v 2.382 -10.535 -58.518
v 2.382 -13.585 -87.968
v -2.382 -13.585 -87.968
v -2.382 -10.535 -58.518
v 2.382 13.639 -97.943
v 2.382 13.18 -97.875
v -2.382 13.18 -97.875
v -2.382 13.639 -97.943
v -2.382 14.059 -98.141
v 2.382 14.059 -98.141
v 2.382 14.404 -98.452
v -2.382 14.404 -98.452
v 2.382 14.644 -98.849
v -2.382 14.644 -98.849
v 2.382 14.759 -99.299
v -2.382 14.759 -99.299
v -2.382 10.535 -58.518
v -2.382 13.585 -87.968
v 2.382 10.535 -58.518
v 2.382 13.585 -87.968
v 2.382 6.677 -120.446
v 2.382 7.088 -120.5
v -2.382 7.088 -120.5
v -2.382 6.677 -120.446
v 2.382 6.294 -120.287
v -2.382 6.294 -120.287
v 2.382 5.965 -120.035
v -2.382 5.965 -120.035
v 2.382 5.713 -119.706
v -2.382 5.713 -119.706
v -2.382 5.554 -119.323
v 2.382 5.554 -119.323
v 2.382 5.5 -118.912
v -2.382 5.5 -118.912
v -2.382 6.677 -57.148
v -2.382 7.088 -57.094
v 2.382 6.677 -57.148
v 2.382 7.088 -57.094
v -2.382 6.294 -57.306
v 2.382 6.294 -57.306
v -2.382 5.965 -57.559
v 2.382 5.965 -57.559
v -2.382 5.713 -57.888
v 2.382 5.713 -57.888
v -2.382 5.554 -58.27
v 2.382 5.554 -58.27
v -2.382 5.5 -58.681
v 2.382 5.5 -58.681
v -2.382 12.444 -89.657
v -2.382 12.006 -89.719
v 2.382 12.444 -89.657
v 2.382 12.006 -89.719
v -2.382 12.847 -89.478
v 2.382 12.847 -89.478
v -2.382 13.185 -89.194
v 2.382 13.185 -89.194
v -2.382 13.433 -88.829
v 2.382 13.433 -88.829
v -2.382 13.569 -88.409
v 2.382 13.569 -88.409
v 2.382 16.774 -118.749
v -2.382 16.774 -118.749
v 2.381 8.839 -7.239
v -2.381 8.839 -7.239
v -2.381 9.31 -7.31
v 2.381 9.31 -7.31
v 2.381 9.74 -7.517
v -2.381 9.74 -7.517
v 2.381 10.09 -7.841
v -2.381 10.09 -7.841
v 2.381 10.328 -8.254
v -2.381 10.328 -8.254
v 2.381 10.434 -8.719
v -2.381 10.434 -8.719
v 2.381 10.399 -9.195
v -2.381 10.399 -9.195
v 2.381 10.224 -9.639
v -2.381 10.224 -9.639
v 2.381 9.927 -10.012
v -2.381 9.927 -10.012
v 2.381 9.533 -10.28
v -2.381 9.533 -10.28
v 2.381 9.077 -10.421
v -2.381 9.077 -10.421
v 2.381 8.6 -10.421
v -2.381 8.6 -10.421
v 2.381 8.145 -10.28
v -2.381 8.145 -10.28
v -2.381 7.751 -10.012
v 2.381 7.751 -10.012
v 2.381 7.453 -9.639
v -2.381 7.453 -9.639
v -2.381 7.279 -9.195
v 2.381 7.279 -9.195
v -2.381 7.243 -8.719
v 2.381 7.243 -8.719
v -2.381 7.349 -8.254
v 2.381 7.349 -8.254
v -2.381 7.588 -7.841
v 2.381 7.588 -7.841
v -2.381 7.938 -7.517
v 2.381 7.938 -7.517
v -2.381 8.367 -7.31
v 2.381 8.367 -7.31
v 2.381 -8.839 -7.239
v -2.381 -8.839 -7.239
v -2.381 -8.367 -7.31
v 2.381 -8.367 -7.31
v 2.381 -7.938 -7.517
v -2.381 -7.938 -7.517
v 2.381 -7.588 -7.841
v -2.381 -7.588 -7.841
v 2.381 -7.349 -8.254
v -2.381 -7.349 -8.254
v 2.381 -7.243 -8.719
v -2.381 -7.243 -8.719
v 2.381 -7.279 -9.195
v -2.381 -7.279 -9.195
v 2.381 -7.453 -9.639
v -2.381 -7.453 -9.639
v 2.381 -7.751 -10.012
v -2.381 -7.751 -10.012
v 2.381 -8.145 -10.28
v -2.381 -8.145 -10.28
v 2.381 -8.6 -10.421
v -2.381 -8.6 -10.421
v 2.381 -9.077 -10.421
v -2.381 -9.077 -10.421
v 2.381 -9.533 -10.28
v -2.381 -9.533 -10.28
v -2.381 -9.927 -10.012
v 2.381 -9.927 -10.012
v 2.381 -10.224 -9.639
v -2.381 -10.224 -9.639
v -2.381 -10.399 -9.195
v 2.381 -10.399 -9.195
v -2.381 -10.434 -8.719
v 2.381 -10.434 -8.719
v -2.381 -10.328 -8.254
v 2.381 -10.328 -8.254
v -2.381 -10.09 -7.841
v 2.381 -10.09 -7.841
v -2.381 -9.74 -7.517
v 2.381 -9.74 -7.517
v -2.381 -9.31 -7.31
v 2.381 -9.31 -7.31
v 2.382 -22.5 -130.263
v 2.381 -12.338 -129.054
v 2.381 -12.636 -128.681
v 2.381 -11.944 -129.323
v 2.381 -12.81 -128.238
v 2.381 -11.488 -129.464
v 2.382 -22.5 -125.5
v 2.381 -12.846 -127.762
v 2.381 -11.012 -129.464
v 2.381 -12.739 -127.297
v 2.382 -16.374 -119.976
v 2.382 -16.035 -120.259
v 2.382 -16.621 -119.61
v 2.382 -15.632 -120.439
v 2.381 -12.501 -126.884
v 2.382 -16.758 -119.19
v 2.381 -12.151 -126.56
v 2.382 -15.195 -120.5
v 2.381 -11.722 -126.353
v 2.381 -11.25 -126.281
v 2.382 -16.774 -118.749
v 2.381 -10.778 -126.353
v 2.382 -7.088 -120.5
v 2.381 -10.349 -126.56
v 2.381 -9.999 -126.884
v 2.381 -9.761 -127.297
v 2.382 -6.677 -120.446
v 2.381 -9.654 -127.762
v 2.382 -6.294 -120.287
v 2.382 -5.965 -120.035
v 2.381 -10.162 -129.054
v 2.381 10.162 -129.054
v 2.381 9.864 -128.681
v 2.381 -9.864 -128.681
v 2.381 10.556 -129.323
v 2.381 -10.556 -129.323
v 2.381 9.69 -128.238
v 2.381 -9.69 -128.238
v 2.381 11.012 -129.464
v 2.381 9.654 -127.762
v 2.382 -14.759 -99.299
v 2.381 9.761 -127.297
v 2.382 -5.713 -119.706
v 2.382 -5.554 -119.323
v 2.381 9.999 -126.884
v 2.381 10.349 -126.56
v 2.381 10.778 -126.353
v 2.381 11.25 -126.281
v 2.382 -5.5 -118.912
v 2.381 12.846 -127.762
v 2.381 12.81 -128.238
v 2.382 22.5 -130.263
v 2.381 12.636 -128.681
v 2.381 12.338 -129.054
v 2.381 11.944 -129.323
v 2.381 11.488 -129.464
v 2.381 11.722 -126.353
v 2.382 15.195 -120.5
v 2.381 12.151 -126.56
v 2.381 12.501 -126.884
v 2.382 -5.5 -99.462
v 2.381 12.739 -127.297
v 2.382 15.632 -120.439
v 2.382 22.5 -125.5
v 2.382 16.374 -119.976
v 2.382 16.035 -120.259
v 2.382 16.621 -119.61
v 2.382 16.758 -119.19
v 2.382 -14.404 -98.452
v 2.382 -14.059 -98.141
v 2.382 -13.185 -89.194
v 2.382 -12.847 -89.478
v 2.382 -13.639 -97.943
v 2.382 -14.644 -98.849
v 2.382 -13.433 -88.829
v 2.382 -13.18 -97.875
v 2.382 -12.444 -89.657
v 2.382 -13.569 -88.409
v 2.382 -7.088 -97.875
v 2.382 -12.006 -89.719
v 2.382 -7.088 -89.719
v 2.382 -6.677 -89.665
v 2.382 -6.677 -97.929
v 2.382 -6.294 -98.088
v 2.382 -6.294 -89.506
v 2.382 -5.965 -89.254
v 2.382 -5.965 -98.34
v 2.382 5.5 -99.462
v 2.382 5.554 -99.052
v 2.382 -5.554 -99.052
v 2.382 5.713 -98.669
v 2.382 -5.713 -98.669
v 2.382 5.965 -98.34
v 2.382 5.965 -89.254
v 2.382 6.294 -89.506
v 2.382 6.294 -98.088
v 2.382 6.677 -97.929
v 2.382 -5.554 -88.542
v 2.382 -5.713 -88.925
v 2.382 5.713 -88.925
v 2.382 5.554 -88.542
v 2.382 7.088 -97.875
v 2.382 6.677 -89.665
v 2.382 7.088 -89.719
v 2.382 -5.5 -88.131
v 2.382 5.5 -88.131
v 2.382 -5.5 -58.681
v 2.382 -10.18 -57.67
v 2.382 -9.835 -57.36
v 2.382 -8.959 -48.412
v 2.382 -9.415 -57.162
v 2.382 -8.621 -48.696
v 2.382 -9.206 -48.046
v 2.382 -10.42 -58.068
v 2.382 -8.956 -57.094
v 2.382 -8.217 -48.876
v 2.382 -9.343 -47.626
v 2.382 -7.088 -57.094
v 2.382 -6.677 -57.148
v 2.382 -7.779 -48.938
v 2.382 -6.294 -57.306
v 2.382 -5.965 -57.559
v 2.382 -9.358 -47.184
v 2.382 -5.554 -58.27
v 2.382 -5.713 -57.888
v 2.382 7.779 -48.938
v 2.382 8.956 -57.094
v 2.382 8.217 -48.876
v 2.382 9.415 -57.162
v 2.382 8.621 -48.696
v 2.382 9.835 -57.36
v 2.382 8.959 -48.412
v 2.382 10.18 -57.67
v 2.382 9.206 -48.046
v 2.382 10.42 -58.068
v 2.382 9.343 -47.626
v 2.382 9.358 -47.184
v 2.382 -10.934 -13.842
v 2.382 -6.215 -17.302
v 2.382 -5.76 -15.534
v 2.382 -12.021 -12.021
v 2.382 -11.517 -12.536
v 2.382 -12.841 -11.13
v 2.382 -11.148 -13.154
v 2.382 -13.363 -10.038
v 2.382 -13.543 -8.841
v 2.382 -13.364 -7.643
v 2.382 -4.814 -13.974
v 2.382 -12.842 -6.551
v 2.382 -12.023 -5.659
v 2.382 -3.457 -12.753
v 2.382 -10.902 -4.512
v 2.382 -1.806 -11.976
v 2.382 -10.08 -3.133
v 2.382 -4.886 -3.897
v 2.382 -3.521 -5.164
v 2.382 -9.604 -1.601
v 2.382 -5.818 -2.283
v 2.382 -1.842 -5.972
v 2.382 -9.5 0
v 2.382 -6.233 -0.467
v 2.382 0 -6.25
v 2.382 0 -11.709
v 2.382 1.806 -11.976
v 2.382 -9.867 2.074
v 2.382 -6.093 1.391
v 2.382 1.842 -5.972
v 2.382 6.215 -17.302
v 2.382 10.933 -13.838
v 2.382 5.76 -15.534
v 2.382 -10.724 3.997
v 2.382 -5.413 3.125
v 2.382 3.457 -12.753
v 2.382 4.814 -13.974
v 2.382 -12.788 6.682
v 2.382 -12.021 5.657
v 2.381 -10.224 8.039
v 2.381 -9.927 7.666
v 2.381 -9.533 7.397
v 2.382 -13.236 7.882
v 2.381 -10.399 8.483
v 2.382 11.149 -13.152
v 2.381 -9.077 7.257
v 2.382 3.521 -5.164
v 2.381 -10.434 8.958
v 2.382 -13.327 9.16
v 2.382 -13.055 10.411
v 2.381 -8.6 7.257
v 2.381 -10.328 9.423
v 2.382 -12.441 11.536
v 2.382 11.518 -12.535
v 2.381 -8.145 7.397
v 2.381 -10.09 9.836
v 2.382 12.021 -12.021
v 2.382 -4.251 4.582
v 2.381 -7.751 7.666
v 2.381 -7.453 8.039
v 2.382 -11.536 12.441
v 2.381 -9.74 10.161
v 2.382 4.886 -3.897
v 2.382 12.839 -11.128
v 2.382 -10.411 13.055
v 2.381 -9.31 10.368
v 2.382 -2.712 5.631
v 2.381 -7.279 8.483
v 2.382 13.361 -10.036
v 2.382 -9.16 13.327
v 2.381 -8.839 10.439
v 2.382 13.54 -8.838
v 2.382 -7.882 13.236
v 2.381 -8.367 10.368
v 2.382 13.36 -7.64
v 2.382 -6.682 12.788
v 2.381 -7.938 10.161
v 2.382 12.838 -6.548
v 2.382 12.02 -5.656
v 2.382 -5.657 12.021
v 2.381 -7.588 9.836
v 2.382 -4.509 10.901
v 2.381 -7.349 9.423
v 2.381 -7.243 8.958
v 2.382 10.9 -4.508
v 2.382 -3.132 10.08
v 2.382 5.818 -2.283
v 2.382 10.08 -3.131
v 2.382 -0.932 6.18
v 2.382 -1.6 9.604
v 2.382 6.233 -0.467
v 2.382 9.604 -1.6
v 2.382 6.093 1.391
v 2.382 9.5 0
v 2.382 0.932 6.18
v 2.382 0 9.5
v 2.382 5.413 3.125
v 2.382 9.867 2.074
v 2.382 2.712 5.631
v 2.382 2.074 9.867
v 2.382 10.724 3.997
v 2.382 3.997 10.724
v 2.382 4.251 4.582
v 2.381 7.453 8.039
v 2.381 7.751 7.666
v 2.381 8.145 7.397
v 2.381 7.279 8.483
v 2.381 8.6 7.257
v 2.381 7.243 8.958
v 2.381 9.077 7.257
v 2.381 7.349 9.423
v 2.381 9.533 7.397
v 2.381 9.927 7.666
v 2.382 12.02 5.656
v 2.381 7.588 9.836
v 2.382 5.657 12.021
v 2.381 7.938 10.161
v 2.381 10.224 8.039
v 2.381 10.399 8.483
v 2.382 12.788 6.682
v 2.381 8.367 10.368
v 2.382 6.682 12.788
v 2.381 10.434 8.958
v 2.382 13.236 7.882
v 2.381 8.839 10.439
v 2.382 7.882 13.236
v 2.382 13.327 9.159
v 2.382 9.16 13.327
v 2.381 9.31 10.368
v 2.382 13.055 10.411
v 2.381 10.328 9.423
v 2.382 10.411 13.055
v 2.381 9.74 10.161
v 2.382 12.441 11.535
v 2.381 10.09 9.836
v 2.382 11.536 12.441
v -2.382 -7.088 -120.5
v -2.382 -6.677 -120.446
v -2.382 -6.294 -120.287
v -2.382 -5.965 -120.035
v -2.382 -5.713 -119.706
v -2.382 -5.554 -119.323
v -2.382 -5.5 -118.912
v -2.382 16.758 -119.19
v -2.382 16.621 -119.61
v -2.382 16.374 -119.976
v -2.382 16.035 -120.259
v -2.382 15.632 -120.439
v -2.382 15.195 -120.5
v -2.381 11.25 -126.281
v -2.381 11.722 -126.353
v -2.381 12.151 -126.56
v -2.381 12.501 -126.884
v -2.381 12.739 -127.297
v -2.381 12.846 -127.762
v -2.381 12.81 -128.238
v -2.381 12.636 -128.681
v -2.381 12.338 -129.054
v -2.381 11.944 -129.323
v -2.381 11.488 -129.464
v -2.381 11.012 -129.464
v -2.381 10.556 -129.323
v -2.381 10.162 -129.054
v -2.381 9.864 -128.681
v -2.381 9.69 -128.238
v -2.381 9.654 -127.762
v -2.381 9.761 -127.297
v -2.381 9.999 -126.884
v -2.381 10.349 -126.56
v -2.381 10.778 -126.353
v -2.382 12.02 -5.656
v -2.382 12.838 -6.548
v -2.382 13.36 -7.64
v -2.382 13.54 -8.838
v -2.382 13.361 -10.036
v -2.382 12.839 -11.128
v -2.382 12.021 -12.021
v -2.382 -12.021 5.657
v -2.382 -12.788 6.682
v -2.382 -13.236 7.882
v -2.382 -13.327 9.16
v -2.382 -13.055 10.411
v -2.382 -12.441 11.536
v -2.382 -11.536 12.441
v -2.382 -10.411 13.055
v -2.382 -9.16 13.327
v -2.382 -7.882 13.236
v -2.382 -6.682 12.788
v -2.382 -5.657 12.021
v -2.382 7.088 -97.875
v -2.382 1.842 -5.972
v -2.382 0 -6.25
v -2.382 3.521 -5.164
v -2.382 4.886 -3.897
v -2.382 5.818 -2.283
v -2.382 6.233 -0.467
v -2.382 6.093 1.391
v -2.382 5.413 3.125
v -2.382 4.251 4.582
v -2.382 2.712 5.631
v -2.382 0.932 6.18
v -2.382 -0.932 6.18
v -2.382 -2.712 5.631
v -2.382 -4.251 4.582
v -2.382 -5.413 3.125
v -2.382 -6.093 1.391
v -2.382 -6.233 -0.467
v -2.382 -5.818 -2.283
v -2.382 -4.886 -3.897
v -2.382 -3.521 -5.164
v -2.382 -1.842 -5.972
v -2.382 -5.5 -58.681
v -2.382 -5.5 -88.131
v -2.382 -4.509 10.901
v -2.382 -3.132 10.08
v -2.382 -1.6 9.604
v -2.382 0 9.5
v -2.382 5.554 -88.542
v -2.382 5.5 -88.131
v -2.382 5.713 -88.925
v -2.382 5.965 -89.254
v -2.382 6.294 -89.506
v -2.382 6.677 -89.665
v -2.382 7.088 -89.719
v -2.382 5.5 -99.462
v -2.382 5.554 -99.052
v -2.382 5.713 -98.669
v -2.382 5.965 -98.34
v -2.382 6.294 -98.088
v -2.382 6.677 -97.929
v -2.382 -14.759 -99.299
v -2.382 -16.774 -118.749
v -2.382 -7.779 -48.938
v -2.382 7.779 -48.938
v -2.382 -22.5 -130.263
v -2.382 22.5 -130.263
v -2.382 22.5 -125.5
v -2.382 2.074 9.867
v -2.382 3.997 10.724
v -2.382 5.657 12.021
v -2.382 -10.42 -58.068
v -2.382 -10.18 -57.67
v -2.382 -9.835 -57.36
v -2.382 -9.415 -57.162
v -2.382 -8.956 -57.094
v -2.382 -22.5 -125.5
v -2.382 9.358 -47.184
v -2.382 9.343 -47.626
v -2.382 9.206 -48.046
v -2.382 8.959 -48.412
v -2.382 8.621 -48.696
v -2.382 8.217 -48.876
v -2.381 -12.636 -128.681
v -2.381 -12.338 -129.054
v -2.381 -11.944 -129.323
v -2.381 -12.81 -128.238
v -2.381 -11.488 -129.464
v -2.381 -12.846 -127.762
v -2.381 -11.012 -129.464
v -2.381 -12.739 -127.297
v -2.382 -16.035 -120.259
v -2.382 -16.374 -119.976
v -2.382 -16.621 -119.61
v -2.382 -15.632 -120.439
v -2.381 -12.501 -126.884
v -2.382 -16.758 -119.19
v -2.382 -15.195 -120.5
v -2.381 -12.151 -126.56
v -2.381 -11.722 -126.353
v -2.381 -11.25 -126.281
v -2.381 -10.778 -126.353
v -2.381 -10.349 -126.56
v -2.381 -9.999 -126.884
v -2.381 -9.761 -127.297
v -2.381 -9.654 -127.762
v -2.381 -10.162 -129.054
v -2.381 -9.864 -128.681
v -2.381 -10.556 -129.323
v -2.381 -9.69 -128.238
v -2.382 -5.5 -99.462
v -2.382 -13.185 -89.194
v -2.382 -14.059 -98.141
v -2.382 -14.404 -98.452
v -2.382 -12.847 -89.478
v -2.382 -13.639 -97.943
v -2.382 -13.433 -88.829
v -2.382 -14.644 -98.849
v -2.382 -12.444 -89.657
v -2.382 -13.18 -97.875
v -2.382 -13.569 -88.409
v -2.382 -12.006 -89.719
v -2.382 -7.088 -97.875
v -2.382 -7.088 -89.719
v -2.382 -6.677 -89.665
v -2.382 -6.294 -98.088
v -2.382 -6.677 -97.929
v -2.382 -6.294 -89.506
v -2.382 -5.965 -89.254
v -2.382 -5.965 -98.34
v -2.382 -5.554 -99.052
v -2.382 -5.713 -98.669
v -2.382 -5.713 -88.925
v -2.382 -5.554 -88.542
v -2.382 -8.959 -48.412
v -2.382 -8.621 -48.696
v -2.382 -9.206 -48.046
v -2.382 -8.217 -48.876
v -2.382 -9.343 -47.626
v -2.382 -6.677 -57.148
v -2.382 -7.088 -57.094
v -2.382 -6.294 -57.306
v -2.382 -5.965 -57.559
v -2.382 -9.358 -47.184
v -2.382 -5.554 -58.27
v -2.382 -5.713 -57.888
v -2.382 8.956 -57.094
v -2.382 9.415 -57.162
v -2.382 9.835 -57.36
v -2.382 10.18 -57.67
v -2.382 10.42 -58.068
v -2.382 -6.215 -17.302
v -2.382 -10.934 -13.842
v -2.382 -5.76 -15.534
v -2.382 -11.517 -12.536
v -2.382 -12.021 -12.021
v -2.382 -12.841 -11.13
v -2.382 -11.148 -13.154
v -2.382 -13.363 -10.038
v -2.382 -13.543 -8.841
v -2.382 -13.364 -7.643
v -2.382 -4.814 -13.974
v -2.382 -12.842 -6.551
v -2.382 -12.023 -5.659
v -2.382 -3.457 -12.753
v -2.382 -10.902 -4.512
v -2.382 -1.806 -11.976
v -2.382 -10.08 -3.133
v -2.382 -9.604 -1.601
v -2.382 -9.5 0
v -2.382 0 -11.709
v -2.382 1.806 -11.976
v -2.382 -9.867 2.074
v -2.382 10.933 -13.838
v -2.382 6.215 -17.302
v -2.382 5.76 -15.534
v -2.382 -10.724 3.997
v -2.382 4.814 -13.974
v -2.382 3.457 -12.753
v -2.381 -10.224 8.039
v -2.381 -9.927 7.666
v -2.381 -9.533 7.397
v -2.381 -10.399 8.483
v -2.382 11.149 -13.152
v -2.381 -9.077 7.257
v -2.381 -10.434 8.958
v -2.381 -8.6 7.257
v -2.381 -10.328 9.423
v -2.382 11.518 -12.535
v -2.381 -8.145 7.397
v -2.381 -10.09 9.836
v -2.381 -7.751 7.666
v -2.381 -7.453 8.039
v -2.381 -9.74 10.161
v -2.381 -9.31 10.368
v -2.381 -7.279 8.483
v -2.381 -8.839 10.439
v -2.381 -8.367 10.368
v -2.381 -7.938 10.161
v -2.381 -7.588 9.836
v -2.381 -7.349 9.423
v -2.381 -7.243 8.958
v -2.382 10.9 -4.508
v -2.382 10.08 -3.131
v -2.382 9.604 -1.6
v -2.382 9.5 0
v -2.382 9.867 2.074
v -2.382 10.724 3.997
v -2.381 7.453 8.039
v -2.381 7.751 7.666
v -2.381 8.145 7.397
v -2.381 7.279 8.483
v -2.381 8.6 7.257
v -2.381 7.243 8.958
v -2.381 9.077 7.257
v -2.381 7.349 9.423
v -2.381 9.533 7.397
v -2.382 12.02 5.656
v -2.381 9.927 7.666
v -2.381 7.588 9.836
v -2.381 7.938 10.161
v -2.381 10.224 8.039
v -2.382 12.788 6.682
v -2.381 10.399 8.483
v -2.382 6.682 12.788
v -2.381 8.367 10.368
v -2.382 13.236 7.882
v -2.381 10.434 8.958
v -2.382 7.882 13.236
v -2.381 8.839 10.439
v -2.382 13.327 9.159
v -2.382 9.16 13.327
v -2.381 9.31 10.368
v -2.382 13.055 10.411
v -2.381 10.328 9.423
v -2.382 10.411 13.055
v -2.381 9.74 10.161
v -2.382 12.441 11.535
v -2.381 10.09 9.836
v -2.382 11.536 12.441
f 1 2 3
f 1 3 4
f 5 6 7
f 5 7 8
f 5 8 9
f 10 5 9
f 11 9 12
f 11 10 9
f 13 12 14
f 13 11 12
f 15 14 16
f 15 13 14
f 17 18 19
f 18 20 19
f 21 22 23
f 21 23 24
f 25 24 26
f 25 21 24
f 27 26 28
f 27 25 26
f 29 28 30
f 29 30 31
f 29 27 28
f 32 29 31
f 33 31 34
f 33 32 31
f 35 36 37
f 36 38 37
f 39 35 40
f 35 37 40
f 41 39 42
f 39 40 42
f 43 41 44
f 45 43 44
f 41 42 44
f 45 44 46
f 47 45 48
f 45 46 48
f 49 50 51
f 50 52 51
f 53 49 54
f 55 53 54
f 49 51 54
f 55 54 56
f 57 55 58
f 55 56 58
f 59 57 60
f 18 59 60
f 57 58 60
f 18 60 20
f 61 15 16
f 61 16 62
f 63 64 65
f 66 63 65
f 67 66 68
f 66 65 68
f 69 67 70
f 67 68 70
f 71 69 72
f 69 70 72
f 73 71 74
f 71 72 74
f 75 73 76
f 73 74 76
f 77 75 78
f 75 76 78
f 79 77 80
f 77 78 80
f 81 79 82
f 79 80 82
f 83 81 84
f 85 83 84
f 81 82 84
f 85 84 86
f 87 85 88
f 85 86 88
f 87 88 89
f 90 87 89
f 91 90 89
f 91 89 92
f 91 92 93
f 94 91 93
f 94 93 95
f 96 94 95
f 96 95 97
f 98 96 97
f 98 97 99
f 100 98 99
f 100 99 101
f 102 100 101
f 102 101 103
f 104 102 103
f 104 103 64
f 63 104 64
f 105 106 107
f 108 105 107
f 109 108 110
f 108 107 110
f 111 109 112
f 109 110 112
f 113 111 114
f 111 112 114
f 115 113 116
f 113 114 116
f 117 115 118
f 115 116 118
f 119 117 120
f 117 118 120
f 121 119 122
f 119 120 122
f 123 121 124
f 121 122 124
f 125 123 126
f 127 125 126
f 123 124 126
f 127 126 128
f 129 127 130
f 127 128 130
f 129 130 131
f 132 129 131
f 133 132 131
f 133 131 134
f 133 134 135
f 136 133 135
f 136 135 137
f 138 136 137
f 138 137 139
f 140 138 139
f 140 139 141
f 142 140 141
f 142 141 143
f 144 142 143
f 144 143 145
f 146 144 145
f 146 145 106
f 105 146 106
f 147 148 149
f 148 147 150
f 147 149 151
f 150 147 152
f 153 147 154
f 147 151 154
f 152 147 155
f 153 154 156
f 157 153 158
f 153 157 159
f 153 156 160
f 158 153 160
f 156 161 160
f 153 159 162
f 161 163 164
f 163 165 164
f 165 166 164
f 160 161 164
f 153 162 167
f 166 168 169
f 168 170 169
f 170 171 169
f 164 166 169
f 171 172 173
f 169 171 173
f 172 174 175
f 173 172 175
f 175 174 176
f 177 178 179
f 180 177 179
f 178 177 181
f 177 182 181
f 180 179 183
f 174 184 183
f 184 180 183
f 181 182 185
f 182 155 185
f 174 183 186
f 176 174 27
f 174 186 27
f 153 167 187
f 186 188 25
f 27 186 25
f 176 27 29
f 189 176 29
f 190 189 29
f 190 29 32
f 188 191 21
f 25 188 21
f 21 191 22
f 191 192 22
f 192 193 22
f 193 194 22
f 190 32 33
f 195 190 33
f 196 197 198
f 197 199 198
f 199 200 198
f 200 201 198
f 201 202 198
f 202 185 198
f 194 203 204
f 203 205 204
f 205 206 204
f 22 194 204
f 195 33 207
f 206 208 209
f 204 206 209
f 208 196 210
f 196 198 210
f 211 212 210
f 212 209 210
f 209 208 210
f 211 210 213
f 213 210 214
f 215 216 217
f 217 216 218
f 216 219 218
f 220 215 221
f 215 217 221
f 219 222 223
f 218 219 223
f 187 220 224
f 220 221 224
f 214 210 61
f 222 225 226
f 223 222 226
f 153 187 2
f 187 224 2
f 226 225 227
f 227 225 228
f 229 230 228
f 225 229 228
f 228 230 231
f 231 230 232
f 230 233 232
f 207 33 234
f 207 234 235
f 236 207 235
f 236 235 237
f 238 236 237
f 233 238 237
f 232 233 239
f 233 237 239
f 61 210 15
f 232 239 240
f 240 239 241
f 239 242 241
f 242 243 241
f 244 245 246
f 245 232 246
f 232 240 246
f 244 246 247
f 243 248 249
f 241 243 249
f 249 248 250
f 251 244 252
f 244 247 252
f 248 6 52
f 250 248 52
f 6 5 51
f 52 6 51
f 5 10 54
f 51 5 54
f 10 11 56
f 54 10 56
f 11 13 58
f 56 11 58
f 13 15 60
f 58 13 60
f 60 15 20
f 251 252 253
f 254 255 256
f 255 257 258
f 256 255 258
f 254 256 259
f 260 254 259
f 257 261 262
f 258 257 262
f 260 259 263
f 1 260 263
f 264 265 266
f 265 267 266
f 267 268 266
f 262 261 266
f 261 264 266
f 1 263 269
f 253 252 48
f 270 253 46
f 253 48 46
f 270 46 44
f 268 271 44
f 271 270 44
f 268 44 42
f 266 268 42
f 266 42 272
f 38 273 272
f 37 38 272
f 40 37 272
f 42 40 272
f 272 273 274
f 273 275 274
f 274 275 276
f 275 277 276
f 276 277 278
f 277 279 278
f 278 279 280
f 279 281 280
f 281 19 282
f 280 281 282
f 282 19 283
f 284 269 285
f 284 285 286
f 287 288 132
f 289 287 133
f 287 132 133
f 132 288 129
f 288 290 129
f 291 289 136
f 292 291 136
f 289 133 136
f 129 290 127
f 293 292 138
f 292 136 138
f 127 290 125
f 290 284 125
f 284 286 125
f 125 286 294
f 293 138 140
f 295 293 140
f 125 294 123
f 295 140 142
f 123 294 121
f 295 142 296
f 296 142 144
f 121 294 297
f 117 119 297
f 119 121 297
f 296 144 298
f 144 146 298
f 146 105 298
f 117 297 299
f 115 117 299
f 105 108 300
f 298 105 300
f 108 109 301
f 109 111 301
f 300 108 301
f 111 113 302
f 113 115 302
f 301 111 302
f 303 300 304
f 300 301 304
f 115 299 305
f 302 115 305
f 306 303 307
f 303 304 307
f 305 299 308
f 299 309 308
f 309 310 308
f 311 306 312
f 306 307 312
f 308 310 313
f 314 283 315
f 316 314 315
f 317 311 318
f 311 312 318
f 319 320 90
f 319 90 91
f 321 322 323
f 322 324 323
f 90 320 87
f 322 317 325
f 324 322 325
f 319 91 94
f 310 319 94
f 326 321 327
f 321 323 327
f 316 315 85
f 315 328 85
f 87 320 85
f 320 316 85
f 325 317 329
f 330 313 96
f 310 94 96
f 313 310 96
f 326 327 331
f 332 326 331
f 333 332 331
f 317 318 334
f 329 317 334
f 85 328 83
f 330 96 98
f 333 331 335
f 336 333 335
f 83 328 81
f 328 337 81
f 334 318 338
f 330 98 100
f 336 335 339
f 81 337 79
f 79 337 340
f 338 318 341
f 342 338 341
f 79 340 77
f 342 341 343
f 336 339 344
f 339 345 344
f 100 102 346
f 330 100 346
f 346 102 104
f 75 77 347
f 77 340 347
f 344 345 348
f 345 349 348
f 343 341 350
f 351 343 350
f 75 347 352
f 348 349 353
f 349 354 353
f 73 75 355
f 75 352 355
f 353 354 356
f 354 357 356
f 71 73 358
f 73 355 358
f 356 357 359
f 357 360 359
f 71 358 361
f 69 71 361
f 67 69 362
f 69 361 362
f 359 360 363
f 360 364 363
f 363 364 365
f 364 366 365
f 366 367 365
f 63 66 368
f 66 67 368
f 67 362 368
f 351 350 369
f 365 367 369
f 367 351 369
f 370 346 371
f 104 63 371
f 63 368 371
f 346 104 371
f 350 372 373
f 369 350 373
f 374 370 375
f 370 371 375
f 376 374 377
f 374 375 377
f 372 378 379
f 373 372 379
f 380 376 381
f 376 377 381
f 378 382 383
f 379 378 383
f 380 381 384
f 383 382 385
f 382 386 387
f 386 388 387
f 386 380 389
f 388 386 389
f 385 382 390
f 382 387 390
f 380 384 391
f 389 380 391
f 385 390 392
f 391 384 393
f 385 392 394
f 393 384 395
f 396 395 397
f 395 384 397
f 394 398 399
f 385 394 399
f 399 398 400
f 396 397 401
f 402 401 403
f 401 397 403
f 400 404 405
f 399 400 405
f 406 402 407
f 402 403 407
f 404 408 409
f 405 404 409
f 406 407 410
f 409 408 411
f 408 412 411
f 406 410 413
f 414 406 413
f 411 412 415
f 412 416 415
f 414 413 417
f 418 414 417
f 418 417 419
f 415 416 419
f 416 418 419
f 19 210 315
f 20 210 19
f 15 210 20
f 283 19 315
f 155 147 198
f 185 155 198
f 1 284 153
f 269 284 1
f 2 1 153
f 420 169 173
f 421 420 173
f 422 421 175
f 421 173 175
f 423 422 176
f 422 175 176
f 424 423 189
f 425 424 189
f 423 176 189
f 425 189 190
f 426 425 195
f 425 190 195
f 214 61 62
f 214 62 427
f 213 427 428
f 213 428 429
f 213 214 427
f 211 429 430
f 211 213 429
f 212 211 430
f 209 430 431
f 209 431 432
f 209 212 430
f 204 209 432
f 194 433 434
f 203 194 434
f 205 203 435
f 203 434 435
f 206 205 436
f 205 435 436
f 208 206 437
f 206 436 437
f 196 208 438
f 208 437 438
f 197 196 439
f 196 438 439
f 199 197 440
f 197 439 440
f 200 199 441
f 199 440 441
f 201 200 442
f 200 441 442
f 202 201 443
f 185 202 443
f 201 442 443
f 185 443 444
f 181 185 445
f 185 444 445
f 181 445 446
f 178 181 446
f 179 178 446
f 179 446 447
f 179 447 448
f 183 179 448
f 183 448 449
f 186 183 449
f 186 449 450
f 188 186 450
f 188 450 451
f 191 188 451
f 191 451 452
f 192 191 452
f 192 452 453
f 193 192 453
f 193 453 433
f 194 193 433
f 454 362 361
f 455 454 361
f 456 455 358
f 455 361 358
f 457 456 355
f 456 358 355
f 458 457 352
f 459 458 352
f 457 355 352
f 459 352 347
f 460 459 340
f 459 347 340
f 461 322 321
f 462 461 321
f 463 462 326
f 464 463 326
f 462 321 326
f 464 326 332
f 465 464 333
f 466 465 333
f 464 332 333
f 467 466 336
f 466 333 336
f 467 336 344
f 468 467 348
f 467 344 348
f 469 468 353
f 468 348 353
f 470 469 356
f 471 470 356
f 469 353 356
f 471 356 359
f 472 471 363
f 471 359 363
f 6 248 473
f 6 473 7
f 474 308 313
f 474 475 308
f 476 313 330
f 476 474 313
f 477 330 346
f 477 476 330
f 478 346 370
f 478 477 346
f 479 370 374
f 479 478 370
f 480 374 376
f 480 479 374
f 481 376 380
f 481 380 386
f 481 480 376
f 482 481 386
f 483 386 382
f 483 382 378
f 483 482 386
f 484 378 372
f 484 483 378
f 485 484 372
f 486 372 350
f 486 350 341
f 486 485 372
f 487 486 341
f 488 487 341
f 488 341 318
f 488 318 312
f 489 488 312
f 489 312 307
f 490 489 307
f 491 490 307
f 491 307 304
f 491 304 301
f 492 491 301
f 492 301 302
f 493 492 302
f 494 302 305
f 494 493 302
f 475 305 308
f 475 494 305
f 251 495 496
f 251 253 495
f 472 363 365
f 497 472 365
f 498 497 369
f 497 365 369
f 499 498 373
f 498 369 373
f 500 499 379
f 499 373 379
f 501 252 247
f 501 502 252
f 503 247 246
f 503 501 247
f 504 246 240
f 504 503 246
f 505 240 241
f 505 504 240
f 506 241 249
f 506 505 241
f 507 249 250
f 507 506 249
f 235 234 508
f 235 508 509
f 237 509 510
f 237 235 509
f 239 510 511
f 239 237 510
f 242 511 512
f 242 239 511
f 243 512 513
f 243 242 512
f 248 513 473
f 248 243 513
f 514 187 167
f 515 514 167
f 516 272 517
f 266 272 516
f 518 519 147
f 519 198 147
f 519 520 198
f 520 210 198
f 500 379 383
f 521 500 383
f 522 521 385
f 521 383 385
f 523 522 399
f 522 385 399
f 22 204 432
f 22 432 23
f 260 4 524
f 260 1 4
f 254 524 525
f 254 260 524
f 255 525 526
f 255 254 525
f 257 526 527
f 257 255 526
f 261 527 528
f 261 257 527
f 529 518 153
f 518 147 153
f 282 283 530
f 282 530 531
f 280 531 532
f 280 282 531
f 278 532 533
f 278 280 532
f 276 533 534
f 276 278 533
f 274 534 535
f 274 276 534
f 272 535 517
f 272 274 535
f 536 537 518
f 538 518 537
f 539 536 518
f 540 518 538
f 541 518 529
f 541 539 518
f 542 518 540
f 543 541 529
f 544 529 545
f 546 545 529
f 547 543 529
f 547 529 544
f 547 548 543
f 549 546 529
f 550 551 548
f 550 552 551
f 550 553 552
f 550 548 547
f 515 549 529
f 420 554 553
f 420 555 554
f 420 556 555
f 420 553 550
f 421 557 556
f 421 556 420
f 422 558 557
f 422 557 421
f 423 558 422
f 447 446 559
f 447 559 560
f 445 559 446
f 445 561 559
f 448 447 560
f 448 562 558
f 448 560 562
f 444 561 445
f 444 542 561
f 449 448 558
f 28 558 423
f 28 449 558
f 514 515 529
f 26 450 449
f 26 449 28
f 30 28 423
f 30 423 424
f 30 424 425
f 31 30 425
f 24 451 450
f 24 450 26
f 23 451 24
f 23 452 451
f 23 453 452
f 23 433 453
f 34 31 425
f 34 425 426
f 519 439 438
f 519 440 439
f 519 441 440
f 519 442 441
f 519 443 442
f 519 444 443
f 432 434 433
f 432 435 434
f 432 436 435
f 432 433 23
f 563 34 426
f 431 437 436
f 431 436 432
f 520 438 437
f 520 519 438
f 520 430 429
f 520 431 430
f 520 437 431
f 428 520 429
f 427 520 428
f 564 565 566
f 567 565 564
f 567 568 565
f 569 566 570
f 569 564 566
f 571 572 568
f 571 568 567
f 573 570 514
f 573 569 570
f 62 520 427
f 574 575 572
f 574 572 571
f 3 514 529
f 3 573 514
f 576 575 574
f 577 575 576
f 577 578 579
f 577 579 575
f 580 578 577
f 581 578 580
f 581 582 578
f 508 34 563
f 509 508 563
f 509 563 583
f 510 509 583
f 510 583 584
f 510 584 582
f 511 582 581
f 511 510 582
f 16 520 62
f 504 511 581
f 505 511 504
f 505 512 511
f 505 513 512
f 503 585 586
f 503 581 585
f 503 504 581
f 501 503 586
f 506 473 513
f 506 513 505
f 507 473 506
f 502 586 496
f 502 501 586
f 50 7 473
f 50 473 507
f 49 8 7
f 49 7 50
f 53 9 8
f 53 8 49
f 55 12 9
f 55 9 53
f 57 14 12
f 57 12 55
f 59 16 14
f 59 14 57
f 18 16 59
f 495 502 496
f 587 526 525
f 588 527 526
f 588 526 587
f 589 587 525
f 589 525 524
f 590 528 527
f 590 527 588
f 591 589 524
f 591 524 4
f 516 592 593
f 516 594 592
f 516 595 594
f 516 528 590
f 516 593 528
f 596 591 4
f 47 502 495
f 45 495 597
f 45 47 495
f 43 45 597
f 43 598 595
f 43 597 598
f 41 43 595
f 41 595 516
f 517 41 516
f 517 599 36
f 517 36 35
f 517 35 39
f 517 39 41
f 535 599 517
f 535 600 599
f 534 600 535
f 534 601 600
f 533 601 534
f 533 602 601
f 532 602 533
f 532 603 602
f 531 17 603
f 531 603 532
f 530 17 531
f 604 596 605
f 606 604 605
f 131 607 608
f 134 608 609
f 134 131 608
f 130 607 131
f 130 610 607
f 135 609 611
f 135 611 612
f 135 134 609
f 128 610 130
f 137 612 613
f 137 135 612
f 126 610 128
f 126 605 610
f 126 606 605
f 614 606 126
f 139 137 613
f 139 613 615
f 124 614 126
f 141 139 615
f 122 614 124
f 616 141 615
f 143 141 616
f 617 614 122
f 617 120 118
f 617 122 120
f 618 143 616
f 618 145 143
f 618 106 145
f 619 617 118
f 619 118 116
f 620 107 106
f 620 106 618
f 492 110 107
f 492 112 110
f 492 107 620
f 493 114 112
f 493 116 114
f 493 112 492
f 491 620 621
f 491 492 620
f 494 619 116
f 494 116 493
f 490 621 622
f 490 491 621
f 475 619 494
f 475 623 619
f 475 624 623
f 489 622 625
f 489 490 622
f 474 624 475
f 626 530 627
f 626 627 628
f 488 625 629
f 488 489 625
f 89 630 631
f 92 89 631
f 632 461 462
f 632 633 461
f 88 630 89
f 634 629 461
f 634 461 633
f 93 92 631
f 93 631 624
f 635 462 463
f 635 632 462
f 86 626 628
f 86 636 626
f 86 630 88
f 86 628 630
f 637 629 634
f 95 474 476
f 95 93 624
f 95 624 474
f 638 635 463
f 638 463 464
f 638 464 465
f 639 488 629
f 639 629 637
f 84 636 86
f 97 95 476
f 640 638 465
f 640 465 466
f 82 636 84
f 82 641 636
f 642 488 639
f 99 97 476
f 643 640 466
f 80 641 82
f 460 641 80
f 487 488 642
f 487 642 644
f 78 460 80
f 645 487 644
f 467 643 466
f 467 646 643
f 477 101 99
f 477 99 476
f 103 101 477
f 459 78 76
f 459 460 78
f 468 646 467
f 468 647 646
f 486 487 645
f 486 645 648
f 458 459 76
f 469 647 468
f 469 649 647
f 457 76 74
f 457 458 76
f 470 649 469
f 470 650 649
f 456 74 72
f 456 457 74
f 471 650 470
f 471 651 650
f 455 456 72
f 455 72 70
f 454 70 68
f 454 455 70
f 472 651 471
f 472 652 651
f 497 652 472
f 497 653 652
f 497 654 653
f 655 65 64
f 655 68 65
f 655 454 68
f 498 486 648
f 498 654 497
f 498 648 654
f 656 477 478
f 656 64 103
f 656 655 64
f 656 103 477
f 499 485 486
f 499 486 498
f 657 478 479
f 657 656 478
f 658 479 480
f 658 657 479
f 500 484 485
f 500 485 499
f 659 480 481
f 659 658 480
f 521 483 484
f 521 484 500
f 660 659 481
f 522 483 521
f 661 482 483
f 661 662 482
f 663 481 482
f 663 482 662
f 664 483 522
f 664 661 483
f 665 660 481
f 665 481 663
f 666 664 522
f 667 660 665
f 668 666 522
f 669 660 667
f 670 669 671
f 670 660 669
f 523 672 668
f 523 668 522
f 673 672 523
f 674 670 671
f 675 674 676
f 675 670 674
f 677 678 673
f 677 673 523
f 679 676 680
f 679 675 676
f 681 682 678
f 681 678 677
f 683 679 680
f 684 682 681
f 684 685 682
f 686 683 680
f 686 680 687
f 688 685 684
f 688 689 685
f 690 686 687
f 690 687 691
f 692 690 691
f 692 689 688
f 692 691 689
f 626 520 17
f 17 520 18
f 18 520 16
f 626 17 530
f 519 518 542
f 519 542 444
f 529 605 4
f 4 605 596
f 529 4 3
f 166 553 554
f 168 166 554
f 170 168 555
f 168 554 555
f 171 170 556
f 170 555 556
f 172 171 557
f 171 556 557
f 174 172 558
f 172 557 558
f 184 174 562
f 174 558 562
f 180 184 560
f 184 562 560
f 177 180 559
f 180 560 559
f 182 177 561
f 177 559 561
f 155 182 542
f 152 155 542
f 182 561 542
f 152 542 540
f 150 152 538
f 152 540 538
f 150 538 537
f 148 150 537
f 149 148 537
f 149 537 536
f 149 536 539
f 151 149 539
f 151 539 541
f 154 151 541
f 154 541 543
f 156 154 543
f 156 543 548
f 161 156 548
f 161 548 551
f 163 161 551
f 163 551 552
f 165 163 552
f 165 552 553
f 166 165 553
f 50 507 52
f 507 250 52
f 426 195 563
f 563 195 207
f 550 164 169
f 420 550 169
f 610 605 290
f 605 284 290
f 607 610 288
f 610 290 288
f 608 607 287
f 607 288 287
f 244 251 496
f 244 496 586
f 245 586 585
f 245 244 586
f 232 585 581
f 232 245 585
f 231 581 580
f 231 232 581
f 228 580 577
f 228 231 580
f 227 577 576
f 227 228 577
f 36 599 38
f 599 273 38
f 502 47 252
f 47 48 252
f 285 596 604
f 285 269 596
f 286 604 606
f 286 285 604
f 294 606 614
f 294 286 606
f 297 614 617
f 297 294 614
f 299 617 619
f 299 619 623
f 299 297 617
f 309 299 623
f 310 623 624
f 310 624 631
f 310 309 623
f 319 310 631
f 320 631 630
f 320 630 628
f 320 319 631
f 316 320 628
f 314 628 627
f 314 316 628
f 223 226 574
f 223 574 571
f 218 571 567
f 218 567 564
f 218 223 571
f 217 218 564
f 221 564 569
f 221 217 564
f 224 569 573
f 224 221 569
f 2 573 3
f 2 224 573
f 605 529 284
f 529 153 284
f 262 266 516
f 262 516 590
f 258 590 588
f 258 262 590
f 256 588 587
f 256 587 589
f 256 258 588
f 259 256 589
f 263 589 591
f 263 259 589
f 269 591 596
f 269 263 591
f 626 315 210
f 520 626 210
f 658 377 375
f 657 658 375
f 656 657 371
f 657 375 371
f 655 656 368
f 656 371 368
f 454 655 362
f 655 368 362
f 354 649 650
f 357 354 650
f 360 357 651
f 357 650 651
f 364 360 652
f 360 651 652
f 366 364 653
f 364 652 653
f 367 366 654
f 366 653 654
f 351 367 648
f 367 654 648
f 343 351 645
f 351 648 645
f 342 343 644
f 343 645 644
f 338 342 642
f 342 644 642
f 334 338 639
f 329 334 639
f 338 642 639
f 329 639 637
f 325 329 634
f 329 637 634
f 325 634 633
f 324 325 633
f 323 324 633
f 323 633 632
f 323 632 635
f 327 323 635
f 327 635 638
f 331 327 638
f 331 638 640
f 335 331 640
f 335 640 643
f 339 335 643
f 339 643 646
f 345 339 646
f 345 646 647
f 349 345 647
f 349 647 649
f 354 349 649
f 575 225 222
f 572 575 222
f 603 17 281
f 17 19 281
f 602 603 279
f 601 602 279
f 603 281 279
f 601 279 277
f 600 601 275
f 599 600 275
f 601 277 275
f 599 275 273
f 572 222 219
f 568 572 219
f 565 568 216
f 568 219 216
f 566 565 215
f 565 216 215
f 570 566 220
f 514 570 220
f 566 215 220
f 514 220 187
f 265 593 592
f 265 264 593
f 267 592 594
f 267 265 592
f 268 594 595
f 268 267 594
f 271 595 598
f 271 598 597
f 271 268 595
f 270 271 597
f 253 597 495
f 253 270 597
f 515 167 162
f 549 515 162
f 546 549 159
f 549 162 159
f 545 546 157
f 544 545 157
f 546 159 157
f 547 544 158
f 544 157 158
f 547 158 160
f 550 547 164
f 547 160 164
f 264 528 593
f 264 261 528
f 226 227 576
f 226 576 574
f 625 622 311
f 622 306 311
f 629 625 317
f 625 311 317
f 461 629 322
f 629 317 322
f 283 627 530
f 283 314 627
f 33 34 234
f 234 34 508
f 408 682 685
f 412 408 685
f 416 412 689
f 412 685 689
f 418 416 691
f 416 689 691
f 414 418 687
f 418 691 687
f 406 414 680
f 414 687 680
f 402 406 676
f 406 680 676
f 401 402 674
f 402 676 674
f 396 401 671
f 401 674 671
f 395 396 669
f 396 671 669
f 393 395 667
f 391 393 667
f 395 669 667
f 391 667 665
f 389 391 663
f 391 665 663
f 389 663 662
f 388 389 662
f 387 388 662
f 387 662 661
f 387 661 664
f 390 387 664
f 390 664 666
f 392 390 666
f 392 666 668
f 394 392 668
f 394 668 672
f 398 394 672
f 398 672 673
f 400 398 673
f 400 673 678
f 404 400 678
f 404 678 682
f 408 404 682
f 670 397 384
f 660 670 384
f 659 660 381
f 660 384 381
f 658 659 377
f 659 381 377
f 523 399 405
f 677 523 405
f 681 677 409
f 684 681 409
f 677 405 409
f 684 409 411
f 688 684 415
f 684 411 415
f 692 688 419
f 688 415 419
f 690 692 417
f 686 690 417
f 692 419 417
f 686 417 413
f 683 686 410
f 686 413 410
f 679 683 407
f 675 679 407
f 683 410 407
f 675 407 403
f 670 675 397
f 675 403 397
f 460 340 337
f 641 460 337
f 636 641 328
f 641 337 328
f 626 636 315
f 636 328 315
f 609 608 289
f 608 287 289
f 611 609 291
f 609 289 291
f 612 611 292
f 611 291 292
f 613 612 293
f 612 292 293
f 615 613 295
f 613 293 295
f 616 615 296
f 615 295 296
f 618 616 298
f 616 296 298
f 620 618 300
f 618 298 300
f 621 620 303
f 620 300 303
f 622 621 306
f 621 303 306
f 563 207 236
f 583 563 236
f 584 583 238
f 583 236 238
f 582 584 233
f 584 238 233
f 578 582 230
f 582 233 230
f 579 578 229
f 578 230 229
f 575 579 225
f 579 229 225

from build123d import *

# Parameters (mm, degrees)
SKETCH1_R            = 6.25
BOSS_EXTRUDE1_DEPTH  = 2.3815
M3_CLEARANCE_HOLE1_D = 3.2
M3_CLEARANCE_HOLE2_D = 3.2


with BuildPart() as part:
    # Sketch1 → Boss-Extrude1 (new body, symmetric)
    with BuildSketch(Plane(origin=(0, 0, 0), x_dir=(0, 0, -1), z_dir=(1, 0, 0))):
        with BuildLine():
            Line((13.837853408, 10.933433942), (125.499999966, 22.5))
            Line((125.499999966, 22.5), (130.262999966, 22.5))
            Line((130.262999966, 22.5), (130.262999966, -22.5))
            Line((130.262999966, -22.5), (125.499999966, -22.5))
            Line((125.499999966, -22.5), (13.842307627, -10.933864535))
            ThreePointArc((13.842307627, -10.933864535), (12.834192522, -11.314170817), (12.02081528, -12.02081528))
            ThreePointArc((12.02081528, -12.02081528), (8.840593, -13.543231212), (5.659233624, -12.023192877))
            ThreePointArc((5.659233624, -12.023192877), (3.133291337, -10.08048914), (0, -9.5))
            ThreePointArc((0, -9.5), (-3.061848318, -10.236700307), (-5.656913672, -12.020874702))
            ThreePointArc((-5.656913672, -12.020874702), (-12.020874702, -12.020874704), (-12.020874704, -5.656913674))
            ThreePointArc((-12.020874704, -5.656913674), (-10.079850186, -3.131745006), (-9.500000034, 0))
            ThreePointArc((-9.500000034, 0), (-10.236707938, 3.061753973), (-12.020757217, 5.656796188))
            ThreePointArc((-12.020757217, 5.656796188), (-12.02045467, 12.020757197), (-5.65649366, 12.02045465))
            ThreePointArc((-5.65649366, 12.02045465), (-3.061652792, 10.236409392), (0, 9.5))
            ThreePointArc((0, 9.5), (3.130793061, 10.079739971), (5.655645869, 12.019606441))
            ThreePointArc((5.655645869, 12.019606441), (8.837941978, 13.539821179), (12.02081528, 12.02081528))
            ThreePointArc((12.02081528, 12.02081528), (12.832791387, 11.315799207), (13.837853408, 10.933433942))
        make_face()
        Circle(SKETCH1_R, mode=Mode.SUBTRACT)
        with BuildLine():
            Line((17.302023212, 6.215300033), (47.183954034, 9.358065674))
            ThreePointArc((47.183954034, 9.358065674), (48.412204848, 8.959051834), (48.9375, 7.779273418))
            Line((48.9375, 7.779273418), (48.9375, -7.779269087))
            ThreePointArc((48.9375, -7.779269087), (48.412206576, -8.959045947), (47.183958659, -9.358061829))
            Line((47.183958659, -9.358061829), (17.302047548, -6.21538676))
            ThreePointArc((17.302047548, -6.21538676), (11.709307369, -5.4312e-05), (17.302023212, 6.215300033))
        make_face(mode=Mode.SUBTRACT)
        with BuildLine():
            Line((57.09375, 8.955806876), (57.09375, 7.0875))
            ThreePointArc((57.09375, 7.0875), (57.558717985, 5.964967985), (58.68125, 5.5))
            Line((58.68125, 5.5), (88.13125, 5.5))
            ThreePointArc((88.13125, 5.5), (89.253782015, 5.964967985), (89.71875, 7.0875))
            Line((89.71875, 7.0875), (89.71875, 12.006396363))
            ThreePointArc((89.71875, 12.006396363), (89.194380816, 13.185340432), (87.967683395, 13.585447412))
            Line((87.967683395, 13.585447412), (58.517683395, 10.534857925))
            ThreePointArc((58.517683395, 10.534857925), (57.502305931, 10.018937692), (57.09375, 8.955806876))
        make_face(mode=Mode.SUBTRACT)
        with BuildLine():
            Line((58.68125, -5.5), (88.13125, -5.5))
            ThreePointArc((88.13125, -5.5), (89.253782015, -5.964967985), (89.71875, -7.0875))
            Line((89.71875, -7.0875), (89.71875, -12.006377313))
            ThreePointArc((89.71875, -12.006377313), (89.194380958, -13.185321253), (87.967683776, -13.585428401))
            Line((87.967683776, -13.585428401), (58.517683776, -10.534846102))
            ThreePointArc((58.517683776, -10.534846102), (57.502306059, -10.018925972), (57.09375, -8.955795013))
            Line((57.09375, -8.955795013), (57.09375, -7.0875))
            ThreePointArc((57.09375, -7.0875), (57.558717985, -5.964967985), (58.68125, -5.5))
        make_face(mode=Mode.SUBTRACT)
        with BuildLine():
            Line((99.298933395, 14.759199267), (118.74893336, 16.773934935))
            ThreePointArc((118.74893336, 16.773934935), (119.975630782, 16.373827955), (120.499999966, 15.194883886))
            Line((120.499999966, 15.194883886), (120.499999966, 7.0875))
            ThreePointArc((120.499999966, 7.0875), (120.035031981, 5.964967985), (118.912499966, 5.5))
            Line((118.912499966, 5.5), (99.4625, 5.5))
            ThreePointArc((99.4625, 5.5), (98.339967985, 5.964967985), (97.875, 7.0875))
            Line((97.875, 7.0875), (97.875, 13.180148218))
            ThreePointArc((97.875, 13.180148218), (98.283555931, 14.243279034), (99.298933395, 14.759199267))
        make_face(mode=Mode.SUBTRACT)
        with BuildLine():
            Line((118.912499966, -5.5), (99.4625, -5.5))
            ThreePointArc((99.4625, -5.5), (98.339967985, -5.964967985), (97.875, -7.0875))
            Line((97.875, -7.0875), (97.875, -13.180126402))
            ThreePointArc((97.875, -13.180126402), (98.283556059, -14.24325736), (99.298933776, -14.759177491))
            Line((99.298933776, -14.759177491), (118.748933742, -16.773908412))
            ThreePointArc((118.748933742, -16.773908412), (119.975630924, -16.373801264), (120.499999966, -15.194857323))
            Line((120.499999966, -15.194857323), (120.499999966, -7.0875))
            ThreePointArc((120.499999966, -7.0875), (120.035031981, -5.964967985), (118.912499966, -5.5))
        make_face(mode=Mode.SUBTRACT)
    extrude(amount=BOSS_EXTRUDE1_DEPTH, both=True)

    # M3 Clearance Hole1 (through all)
    with Locations(Plane(origin=(2.3815, 0, 0), x_dir=(0, 0, -1), z_dir=(1, 0, 0))):
        with Locations((127.881499966, 11.25), (127.881499966, -11.25)):
            Hole(M3_CLEARANCE_HOLE1_D / 2)

    # M3 Clearance Hole2 (through all)
    with Locations(Plane(origin=(2.3815, 0, 0), x_dir=(0, 0, -1), z_dir=(1, 0, 0))):
        with Locations((-8.838834765, 8.838834765), (8.838834765, 8.838834765), (8.838834765, -8.838834765), (-8.838834765, -8.838834765)):
            Hole(M3_CLEARANCE_HOLE2_D / 2)


solid = part.part
